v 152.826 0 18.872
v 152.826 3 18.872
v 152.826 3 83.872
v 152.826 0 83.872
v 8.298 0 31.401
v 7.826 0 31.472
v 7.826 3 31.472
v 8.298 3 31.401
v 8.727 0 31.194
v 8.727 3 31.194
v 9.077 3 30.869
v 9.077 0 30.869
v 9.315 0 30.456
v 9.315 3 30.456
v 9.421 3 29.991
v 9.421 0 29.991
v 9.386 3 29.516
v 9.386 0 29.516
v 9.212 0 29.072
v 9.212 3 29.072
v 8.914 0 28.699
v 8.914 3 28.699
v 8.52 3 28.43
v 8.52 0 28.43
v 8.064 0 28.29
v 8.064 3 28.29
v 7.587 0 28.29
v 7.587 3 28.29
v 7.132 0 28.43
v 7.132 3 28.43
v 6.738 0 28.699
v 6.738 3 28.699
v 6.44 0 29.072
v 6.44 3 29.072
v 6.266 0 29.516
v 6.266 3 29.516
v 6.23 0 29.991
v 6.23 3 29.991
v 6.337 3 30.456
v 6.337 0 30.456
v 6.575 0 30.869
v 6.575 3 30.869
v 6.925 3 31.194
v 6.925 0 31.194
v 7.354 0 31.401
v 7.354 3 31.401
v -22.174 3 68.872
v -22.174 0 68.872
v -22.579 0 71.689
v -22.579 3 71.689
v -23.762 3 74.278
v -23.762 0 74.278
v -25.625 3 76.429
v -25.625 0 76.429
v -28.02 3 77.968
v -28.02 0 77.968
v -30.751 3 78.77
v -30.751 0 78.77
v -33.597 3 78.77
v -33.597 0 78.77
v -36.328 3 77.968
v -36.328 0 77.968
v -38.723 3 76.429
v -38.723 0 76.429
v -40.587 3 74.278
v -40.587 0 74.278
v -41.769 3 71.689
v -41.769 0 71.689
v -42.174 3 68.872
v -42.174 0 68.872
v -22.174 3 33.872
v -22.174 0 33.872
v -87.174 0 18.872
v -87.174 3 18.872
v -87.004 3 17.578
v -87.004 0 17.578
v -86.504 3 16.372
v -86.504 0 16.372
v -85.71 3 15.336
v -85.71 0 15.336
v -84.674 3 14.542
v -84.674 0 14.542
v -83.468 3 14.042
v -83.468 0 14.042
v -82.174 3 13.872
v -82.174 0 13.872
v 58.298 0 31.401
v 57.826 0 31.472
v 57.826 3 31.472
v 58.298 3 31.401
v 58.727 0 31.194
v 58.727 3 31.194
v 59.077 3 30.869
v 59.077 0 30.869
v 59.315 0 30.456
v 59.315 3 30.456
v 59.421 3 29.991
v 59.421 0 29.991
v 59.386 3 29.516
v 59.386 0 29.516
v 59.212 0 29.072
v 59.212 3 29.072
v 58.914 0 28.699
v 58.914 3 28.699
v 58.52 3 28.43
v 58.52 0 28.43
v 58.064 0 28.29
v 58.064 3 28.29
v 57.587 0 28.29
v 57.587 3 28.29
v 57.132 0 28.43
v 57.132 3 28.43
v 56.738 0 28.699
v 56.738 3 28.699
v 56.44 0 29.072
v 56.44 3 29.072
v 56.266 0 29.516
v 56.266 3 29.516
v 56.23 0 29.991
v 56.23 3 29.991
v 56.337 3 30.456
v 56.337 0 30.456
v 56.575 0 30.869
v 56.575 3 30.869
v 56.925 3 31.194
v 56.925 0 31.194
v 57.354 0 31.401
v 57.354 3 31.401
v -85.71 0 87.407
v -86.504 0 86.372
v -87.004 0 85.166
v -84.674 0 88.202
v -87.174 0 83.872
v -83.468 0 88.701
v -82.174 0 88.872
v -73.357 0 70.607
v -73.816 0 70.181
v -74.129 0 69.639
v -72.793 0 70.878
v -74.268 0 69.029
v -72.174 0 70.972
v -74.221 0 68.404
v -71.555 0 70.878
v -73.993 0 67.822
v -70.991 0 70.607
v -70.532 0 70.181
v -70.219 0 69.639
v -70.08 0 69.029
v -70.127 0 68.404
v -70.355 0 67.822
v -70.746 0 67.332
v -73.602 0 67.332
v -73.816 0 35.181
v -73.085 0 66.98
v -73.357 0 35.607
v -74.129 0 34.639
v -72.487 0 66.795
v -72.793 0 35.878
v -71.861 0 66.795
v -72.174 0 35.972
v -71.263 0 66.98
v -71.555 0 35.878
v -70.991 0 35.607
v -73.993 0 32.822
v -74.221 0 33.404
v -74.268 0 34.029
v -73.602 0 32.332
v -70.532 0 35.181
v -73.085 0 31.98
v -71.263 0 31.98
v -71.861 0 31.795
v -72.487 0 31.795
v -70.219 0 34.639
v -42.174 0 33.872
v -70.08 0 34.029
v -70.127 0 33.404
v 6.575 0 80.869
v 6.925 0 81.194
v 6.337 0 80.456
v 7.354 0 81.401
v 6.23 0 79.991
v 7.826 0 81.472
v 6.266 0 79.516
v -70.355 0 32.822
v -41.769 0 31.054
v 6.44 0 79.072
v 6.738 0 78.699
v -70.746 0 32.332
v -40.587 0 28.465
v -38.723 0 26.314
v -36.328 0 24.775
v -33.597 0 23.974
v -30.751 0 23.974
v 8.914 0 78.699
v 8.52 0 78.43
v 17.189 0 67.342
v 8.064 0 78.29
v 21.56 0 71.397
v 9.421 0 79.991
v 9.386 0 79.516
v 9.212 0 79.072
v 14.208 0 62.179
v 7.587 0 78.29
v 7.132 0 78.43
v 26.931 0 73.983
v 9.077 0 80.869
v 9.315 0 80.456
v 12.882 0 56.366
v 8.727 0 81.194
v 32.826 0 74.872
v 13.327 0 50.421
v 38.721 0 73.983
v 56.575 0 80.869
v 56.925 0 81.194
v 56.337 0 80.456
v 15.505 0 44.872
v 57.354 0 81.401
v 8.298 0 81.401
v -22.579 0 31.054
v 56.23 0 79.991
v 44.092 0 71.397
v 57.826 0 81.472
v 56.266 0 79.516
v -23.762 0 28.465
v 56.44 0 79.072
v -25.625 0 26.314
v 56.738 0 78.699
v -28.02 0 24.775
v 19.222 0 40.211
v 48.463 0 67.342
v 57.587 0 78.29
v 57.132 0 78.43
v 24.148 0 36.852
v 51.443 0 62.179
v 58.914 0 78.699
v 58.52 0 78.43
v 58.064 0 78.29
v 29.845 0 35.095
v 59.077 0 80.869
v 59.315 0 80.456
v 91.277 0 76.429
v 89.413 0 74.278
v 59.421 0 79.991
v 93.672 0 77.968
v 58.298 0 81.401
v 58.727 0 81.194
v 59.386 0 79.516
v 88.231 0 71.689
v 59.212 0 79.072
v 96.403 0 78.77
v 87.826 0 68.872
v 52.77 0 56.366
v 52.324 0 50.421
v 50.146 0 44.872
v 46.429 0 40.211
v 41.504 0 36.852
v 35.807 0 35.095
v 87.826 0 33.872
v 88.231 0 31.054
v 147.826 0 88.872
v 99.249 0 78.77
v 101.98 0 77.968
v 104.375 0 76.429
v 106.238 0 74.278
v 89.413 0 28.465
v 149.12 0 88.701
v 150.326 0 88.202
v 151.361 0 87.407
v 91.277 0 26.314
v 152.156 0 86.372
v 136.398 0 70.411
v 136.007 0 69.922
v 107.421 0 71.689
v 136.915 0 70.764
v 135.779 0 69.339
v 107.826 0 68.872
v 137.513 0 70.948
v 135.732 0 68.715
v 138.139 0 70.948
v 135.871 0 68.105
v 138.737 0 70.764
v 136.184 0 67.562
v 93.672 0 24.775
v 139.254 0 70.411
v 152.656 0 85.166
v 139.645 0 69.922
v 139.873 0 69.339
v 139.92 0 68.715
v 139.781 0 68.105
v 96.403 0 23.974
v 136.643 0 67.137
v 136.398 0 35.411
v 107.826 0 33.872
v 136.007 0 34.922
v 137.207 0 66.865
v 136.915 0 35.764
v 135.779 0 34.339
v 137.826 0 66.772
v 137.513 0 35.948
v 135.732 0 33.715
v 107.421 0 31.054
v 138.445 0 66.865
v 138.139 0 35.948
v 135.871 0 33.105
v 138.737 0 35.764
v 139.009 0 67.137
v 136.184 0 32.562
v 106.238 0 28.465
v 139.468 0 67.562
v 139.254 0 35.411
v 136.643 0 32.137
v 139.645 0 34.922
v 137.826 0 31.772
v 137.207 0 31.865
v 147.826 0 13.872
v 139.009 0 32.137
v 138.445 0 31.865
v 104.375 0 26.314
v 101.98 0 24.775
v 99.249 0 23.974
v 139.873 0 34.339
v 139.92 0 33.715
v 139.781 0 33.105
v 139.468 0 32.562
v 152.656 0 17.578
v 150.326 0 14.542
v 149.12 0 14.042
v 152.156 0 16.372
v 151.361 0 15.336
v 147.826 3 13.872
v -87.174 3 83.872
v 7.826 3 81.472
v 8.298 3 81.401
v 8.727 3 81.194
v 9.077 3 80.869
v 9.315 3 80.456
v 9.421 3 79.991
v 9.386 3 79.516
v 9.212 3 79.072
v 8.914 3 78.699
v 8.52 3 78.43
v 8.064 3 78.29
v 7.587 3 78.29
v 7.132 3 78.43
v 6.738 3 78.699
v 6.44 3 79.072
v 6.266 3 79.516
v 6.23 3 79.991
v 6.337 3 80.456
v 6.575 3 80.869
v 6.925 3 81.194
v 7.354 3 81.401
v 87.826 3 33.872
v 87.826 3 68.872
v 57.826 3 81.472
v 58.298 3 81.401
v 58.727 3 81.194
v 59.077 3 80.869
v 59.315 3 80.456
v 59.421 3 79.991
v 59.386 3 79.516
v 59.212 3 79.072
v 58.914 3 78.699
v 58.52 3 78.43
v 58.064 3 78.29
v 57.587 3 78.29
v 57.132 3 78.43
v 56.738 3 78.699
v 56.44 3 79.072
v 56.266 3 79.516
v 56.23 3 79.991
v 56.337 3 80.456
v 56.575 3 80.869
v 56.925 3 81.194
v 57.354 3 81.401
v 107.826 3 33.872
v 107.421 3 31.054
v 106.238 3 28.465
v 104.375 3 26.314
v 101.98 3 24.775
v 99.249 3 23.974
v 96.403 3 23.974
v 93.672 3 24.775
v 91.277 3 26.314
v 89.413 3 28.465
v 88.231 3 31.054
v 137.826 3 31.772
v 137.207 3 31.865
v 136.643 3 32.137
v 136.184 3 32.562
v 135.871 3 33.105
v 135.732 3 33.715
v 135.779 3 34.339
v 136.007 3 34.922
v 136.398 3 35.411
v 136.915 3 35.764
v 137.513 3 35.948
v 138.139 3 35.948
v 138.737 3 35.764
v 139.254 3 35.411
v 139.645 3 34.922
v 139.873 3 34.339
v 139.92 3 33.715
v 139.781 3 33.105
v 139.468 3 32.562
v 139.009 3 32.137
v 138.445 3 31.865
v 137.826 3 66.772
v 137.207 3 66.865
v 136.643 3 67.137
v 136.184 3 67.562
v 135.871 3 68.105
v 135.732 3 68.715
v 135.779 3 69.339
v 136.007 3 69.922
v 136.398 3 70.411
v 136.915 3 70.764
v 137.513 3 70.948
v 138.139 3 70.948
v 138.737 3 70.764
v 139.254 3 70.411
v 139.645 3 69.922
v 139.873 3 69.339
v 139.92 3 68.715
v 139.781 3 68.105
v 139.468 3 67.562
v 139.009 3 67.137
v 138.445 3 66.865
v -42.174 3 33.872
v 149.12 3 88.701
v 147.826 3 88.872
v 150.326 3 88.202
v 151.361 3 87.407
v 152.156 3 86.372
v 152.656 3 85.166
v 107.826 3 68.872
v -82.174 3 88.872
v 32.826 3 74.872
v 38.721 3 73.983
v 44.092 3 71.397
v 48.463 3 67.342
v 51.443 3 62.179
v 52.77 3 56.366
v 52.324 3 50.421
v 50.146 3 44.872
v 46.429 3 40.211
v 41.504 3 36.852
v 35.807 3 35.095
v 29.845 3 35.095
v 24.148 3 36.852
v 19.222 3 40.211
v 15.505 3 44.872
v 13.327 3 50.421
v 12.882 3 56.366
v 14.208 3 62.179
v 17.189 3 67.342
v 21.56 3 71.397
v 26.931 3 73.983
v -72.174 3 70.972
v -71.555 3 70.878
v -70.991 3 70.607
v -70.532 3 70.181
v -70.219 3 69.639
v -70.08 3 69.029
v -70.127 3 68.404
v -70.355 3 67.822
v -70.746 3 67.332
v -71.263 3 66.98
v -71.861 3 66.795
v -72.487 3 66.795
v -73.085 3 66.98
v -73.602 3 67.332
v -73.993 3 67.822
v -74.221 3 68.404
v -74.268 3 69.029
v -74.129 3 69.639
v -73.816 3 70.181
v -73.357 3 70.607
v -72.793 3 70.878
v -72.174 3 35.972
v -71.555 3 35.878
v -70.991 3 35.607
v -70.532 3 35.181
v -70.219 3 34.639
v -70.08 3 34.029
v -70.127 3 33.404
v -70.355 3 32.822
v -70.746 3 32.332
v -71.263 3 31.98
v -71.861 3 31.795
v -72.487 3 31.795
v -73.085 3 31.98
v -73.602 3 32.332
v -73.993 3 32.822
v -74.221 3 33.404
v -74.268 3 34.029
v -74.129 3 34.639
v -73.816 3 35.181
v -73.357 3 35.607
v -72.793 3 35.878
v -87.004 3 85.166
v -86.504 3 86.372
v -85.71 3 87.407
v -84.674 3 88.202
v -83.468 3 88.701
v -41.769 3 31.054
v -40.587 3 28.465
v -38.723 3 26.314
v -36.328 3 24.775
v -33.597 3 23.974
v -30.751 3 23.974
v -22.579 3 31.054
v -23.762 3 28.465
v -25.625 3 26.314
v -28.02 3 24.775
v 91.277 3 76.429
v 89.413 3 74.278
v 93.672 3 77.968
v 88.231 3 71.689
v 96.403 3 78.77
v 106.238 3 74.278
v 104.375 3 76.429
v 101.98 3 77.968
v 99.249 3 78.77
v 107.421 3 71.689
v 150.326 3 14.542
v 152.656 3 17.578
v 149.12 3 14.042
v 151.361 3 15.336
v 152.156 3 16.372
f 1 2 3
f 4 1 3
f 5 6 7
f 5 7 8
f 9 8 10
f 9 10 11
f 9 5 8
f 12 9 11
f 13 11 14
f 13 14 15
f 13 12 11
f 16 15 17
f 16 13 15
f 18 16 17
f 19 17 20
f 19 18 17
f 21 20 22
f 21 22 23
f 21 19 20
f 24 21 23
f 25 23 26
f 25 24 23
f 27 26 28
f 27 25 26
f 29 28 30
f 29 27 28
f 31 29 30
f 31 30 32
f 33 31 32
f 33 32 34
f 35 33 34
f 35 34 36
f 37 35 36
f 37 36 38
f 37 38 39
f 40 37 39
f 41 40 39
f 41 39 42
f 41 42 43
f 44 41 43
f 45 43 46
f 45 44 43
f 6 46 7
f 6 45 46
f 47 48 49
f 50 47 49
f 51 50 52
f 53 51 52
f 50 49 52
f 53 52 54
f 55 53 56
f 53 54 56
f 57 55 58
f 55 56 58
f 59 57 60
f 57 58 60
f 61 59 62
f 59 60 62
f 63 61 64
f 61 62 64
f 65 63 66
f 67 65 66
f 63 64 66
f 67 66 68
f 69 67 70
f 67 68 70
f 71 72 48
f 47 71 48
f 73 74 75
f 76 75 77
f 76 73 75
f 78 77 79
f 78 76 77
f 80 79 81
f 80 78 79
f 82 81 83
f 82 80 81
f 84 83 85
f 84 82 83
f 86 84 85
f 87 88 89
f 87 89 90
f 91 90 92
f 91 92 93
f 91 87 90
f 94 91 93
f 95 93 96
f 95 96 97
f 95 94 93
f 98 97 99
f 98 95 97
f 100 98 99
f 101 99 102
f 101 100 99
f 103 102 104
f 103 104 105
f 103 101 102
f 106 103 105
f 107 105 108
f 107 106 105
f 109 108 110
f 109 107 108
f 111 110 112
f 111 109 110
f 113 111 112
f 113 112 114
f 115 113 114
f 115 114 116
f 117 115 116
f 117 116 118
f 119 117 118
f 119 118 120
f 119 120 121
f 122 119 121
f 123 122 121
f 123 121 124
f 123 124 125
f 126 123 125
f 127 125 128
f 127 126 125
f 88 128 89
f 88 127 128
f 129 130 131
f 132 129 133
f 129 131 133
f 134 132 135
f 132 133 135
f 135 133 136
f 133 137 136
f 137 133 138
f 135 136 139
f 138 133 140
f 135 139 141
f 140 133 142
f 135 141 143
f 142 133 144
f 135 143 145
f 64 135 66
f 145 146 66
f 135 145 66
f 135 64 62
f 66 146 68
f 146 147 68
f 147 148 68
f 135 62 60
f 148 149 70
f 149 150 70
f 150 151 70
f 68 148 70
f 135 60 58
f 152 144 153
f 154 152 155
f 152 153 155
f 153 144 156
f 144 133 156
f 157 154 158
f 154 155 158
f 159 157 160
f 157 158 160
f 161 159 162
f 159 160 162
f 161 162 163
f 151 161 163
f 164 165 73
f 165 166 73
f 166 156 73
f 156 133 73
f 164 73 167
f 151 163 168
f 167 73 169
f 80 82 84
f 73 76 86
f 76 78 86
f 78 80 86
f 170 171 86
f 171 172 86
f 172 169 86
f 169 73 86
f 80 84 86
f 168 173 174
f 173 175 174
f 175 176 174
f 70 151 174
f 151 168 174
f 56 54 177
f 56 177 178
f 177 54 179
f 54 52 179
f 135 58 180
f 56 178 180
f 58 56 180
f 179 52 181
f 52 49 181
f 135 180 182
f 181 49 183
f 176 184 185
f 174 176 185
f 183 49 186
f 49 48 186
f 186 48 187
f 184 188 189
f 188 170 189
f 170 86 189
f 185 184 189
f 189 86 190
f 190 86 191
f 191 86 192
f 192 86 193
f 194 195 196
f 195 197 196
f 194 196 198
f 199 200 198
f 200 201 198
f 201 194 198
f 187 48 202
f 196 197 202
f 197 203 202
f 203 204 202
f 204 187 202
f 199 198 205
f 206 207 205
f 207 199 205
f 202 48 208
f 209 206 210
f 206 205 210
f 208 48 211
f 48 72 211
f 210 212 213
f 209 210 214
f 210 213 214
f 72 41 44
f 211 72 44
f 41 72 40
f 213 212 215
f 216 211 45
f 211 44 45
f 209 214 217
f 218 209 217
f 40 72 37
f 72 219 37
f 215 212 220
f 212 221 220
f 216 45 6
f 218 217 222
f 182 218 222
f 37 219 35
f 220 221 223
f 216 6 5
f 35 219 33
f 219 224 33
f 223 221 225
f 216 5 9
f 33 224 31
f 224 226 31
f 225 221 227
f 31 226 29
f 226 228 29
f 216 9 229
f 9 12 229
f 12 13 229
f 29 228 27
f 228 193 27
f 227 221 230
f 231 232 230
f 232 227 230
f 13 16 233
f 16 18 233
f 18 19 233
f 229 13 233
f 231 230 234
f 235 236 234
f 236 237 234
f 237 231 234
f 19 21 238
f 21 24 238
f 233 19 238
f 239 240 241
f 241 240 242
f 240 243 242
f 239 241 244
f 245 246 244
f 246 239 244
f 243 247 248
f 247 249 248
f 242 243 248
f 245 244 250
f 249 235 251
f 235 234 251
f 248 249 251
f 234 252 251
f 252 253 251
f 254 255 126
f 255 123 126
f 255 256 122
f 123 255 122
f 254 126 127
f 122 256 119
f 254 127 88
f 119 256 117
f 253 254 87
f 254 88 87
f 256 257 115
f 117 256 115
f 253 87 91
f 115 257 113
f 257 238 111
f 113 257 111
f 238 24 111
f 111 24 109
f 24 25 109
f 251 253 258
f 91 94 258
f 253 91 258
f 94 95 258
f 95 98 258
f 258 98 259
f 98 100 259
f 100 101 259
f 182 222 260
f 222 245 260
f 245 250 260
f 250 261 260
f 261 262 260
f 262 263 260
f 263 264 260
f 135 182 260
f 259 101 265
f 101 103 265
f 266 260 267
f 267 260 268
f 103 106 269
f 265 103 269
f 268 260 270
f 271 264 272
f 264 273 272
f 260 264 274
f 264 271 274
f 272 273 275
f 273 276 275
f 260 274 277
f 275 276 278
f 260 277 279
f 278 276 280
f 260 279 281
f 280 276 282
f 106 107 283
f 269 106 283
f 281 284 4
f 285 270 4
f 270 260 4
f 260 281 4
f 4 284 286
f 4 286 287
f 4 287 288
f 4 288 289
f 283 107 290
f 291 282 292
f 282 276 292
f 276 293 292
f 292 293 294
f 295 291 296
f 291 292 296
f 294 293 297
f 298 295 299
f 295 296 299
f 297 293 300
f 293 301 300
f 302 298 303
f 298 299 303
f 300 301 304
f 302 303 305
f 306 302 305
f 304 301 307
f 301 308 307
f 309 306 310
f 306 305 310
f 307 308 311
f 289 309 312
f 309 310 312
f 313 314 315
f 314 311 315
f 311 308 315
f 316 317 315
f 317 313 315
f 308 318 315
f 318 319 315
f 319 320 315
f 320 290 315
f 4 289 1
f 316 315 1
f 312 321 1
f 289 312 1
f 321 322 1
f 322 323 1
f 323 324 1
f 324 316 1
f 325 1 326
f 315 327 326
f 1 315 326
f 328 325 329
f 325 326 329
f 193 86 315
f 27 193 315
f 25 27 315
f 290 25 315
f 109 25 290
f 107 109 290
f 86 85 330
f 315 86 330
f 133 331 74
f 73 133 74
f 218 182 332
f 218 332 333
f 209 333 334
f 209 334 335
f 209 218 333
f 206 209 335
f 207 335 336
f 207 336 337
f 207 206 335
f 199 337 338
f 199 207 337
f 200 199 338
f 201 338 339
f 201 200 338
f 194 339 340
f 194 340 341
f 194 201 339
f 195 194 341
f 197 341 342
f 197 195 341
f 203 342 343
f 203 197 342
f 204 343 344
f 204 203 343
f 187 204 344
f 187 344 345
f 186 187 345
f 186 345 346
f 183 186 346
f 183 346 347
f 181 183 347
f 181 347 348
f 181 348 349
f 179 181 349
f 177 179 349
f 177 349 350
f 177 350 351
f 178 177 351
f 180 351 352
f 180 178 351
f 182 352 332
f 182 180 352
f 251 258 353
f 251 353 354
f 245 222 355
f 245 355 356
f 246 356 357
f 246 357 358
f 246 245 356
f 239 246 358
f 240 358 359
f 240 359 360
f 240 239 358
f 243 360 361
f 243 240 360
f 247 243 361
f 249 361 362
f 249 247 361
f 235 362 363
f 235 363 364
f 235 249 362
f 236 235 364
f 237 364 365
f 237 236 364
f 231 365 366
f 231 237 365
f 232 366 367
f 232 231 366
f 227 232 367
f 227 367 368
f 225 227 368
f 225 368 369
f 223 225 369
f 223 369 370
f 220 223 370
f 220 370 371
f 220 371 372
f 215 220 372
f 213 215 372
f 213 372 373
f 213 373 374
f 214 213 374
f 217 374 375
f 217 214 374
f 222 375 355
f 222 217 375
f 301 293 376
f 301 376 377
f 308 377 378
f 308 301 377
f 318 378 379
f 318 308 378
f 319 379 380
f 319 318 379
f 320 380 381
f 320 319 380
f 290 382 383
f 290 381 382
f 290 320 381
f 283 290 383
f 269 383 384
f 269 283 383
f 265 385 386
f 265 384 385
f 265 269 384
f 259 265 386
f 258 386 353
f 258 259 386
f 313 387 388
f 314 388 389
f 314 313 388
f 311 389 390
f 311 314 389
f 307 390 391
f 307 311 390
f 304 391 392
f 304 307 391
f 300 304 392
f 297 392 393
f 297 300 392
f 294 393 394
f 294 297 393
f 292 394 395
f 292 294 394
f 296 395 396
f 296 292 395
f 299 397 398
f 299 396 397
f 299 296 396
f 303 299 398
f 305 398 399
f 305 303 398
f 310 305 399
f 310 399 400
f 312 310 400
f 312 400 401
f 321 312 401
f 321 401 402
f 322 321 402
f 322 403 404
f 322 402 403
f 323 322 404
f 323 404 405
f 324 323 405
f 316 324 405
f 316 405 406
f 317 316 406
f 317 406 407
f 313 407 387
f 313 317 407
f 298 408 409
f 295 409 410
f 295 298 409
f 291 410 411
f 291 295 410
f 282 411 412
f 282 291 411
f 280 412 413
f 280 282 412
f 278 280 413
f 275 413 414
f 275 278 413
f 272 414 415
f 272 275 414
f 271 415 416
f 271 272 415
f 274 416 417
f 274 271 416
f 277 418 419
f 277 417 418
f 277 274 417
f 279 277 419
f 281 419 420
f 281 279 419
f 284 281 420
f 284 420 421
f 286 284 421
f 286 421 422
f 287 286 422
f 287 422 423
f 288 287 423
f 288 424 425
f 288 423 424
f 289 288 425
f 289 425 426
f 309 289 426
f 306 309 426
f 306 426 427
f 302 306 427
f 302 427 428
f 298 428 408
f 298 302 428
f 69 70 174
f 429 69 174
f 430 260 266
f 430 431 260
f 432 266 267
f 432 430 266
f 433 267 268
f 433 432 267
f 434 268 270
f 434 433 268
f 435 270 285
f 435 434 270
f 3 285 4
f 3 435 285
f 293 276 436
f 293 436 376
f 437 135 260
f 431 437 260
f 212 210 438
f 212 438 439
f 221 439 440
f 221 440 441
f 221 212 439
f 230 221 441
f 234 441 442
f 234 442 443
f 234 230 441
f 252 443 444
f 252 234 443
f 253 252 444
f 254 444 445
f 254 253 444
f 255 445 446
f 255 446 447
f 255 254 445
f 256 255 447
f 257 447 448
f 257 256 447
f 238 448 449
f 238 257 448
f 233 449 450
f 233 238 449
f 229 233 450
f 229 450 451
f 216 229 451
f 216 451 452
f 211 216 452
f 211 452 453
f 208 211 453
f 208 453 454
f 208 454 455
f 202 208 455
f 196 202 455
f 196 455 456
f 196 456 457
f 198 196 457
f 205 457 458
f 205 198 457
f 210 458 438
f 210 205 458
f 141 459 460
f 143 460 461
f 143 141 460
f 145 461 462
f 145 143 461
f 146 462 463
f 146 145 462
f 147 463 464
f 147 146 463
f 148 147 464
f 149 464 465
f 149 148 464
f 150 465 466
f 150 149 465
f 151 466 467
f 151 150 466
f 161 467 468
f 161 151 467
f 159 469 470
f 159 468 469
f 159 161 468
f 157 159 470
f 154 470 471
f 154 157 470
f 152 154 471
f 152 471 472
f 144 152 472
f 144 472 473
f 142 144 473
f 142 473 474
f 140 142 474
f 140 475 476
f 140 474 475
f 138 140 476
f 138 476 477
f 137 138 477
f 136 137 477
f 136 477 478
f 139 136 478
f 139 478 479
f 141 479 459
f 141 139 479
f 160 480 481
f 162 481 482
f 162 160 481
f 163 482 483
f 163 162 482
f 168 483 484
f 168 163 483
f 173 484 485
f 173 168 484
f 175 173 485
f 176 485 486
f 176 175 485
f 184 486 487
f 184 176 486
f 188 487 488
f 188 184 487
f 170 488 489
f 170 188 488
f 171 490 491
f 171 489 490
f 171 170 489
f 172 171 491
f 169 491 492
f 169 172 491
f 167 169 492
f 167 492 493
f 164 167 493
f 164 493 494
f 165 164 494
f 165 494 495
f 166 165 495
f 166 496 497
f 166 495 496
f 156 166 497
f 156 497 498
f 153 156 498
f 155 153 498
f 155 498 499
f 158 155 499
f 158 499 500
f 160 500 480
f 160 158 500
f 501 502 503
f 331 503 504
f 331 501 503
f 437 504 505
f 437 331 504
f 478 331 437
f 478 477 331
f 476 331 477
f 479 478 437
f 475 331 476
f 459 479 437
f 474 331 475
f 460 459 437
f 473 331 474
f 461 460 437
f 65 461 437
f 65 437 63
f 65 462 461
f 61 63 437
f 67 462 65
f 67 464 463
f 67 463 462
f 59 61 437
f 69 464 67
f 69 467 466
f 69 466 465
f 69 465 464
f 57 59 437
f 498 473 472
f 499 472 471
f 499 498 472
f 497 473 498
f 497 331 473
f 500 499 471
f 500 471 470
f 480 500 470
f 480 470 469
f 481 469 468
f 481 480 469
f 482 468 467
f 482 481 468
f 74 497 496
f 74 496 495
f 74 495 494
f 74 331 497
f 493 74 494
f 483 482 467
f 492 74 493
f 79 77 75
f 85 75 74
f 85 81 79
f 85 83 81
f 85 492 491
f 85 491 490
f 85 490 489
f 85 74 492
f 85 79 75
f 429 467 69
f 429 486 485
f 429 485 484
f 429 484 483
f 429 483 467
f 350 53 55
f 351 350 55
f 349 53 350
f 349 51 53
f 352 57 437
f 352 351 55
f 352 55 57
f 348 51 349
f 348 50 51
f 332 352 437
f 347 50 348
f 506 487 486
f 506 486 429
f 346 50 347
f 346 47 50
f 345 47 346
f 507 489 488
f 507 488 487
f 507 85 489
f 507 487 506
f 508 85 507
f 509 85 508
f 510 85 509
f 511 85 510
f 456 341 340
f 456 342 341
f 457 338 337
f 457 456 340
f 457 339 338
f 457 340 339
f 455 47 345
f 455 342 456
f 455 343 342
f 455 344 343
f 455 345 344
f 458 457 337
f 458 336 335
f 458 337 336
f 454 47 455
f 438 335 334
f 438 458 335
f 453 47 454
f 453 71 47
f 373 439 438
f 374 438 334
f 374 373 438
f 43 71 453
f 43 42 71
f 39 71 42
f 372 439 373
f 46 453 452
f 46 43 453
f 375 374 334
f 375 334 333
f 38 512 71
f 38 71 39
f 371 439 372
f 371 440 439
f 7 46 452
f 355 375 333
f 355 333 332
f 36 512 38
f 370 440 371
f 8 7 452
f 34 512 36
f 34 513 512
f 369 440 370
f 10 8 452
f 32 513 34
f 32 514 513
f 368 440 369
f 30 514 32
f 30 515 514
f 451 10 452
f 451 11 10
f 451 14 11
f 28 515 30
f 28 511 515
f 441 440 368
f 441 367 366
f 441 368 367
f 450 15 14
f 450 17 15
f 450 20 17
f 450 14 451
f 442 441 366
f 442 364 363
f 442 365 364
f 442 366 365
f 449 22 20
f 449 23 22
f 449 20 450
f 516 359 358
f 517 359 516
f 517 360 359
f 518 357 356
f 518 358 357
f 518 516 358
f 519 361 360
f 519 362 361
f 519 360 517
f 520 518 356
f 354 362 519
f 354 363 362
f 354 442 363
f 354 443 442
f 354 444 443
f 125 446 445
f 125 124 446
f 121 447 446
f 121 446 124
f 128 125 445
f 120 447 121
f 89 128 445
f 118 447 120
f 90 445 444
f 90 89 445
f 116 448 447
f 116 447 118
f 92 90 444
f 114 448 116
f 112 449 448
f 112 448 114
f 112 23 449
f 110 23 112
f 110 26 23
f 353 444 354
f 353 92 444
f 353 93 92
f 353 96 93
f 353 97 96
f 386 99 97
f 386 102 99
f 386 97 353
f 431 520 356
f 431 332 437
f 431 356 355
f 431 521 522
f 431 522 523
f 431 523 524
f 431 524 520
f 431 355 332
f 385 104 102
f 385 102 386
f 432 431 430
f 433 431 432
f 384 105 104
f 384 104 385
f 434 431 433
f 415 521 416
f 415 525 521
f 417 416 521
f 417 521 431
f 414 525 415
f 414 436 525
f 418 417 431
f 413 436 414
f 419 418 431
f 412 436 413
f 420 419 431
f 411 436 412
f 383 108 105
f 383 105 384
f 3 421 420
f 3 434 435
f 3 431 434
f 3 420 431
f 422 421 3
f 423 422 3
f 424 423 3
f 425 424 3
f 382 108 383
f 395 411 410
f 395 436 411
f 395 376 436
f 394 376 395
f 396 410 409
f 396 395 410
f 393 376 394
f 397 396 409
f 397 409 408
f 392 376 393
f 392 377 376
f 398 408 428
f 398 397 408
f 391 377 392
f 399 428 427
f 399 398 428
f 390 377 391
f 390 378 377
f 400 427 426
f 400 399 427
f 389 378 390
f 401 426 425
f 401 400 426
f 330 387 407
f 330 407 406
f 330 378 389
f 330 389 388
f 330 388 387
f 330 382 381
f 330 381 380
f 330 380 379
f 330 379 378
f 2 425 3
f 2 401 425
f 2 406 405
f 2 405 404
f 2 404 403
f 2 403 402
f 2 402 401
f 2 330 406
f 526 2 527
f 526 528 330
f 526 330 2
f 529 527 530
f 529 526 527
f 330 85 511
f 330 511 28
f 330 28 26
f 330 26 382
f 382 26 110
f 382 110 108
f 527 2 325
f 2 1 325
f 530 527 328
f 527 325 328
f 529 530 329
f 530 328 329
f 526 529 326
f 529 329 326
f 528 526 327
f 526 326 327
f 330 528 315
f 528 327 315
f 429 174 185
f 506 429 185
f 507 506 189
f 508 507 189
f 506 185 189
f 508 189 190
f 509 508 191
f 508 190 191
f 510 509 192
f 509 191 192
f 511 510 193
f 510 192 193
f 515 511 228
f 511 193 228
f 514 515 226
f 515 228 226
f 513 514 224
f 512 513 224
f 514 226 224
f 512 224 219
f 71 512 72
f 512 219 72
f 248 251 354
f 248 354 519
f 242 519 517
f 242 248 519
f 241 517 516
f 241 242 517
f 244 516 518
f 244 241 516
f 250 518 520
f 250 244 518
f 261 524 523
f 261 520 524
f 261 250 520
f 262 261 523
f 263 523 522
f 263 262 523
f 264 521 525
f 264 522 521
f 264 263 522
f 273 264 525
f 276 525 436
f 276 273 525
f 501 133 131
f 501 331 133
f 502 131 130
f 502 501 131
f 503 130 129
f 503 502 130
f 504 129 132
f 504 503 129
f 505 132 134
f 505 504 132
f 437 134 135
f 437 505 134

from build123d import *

# Parameters (mm, degrees)
SKETCH_1_W          = 400
SKETCH_1_H          = 60
SKETCH_1_R          = 1.6
SKETCH_1_W_2        = 21
SKETCH_1_H_2        = 21
SKETCH_1_W_3        = 240
SKETCH_1_H_3        = 75
SKETCH_1_R_2        = 20
EXTRUDE_1484_DEPTH  = 3
SKETCH_2_R          = 2.05
SKETCH_2_R_2        = 2.1
CUT_EXTRUDE_1_DEPTH = 250.229009796
FILLET_1_R          = 5
SKETCH1_R           = 2.1
CUT_EXTRUDE4_DEPTH  = 250.229009796
CUT_EXTRUDE_2_DEPTH = 10
FILLET_2_R          = 5


with BuildPart() as part:
    # 草图1 → Extrude 1484 (new body)
    # profile 1 of 2: a face of its own
    with BuildSketch(Plane(origin=(0, 0, 0), x_dir=(1, 0, 0), z_dir=(0, 1, 0))):
        with Locations((32.825924772, 16.128249268)):
            Rectangle(SKETCH_1_W, SKETCH_1_H)
        with Locations(Location((-14.674075228, 36.128249268, 0), (0, 0, 270))):
            Circle(SKETCH_1_R, mode=Mode.SUBTRACT)
        with Locations(Location((-14.674075228, 11.128249268, 0), (0, 0, 270))):
            Circle(SKETCH_1_R, mode=Mode.SUBTRACT)
        with Locations(Location((80.325924772, 11.128249268, 0), (0, 0, 270))):
            Circle(SKETCH_1_R, mode=Mode.SUBTRACT)
        with Locations(Location((80.325924772, 36.128249268, 0), (0, 0, 270))):
            Circle(SKETCH_1_R, mode=Mode.SUBTRACT)
        with Locations((32.825924772, 10.628249268)):
            Rectangle(SKETCH_1_W_2, SKETCH_1_H_2, mode=Mode.SUBTRACT)
    # profile 2 of 2: a face of its own
    with BuildSketch(Plane(origin=(0, 0, 0), x_dir=(1, 0, 0), z_dir=(0, 1, 0))):
        with Locations((32.825924772, -51.371750732)):
            Rectangle(SKETCH_1_W_3, SKETCH_1_H_3)
        with Locations(Location((7.825924772, -29.871750732, 0), (0, 0, 270))):
            Circle(SKETCH_1_R, mode=Mode.SUBTRACT)
        with Locations(Location((7.825924772, -79.871750732, 0), (0, 0, 270))):
            Circle(SKETCH_1_R, mode=Mode.SUBTRACT)
        with Locations(Location((57.825924772, -79.871750732, 0), (0, 0, 270))):
            Circle(SKETCH_1_R, mode=Mode.SUBTRACT)
        with Locations(Location((57.825924772, -29.871750732, 0), (0, 0, 270))):
            Circle(SKETCH_1_R, mode=Mode.SUBTRACT)
        with Locations(Location((32.825924772, -54.871750732, 0), (0, 0, 270))):
            Circle(SKETCH_1_R_2, mode=Mode.SUBTRACT)
    extrude(amount=EXTRUDE_1484_DEPTH)

    # 草图2 → 切除-拉伸1 (cut, through all)
    with BuildSketch(Plane(origin=(0, 3, 0), x_dir=(1, 0, 0), z_dir=(0, 1, 0))):
        with Locations(Location((-149.174075228, 29.628249268, 0), (0, 0, 270))):
            Circle(SKETCH_2_R)
        with Locations(Location((-149.174075228, 2.628249268, 0), (0, 0, 270))):
            Circle(SKETCH_2_R)
        with Locations(Location((-121.674075228, 29.628249268, 0), (0, 0, 270))):
            Circle(SKETCH_2_R)
        with Locations(Location((-121.674075228, 2.628249268, 0), (0, 0, 90))):
            Circle(SKETCH_2_R)
        with Locations(Location((-51.674075228, 41.128249268, 0), (0, 0, 270))):
            Circle(SKETCH_2_R_2)
        with Locations(Location((-86.674075228, 41.128249268, 0), (0, 0, 270))):
            Circle(SKETCH_2_R_2)
        with Locations(Location((-51.674075228, -8.871750732, 0), (0, 0, 90))):
            Circle(SKETCH_2_R_2)
        with Locations(Location((-86.674075228, -8.871750732, 0), (0, 0, 90))):
            Circle(SKETCH_2_R_2)
        with Locations(Location((-135.424075228, 41.128249268, 0), (0, 0, 270))):
            Circle(SKETCH_2_R_2)
        with Locations(Location((-135.424075228, -8.871750732, 0), (0, 0, 90))):
            Circle(SKETCH_2_R_2)
        with Locations(Location((201.075924772, -8.871750732, 0), (0, 0, 270))):
            Circle(SKETCH_2_R_2)
        with Locations(Location((201.075924772, 41.128249268, 0), (0, 0, 90))):
            Circle(SKETCH_2_R_2)
        with Locations(Location((152.325924772, -8.871750732, 0), (0, 0, 270))):
            Circle(SKETCH_2_R_2)
        with Locations(Location((117.325924772, -8.871750732, 0), (0, 0, 270))):
            Circle(SKETCH_2_R_2)
        with Locations(Location((152.325924772, 41.128249268, 0), (0, 0, 90))):
            Circle(SKETCH_2_R_2)
        with Locations(Location((117.325924772, 41.128249268, 0), (0, 0, 90))):
            Circle(SKETCH_2_R_2)
        with Locations(Location((187.325924772, 2.628249268, 0), (0, 0, 270))):
            Circle(SKETCH_2_R)
        with Locations(Location((187.325924772, 29.628249268, 0), (0, 0, 90))):
            Circle(SKETCH_2_R)
        with Locations(Location((214.825924772, 2.628249268, 0), (0, 0, 90))):
            Circle(SKETCH_2_R)
        with Locations(Location((214.825924772, 29.628249268, 0), (0, 0, 90))):
            Circle(SKETCH_2_R)
    extrude(amount=-CUT_EXTRUDE_1_DEPTH, mode=Mode.SUBTRACT)

    # 圆角1
    fillet_1_edges = [part.edges().sort_by_distance(p)[0] for p in [
        (-167.174075228, 1.5, 13.871750732),
        (-167.174075228, 1.5, -46.128249268),
        (232.825924772, 1.5, -46.128249268),
        (232.825924772, 1.5, 13.871750732),
        (152.825924772, 1.5, 13.871750732),
        (152.825924772, 1.5, 88.871750732),
        (-87.174075228, 1.5, 88.871750732),
        (-87.174075228, 1.5, 13.871750732),
    ]]
    fillet(fillet_1_edges, radius=FILLET_1_R)

    # Sketch1 → Cut-Extrude4 (cut, through all)
    with BuildSketch(Plane(origin=(0, 0, 0), x_dir=(1, 0, 0), z_dir=(0, 1, 0))):
        with Locations(Location((-72.174075228, -33.871750732, 0), (0, 0, 270))):
            Circle(SKETCH1_R)
        with Locations(Location((-72.174075228, -68.871750732, 0), (0, 0, 270))):
            Circle(SKETCH1_R)
        with Locations(Location((137.825924772, -68.871750732, 0), (0, 0, 90))):
            Circle(SKETCH1_R)
        with Locations(Location((137.825924772, -33.871750732, 0), (0, 0, 90))):
            Circle(SKETCH1_R)
        with BuildLine():
            Line((-42.174075228, -68.871750732), (-42.174075228, -33.871750732))
            ThreePointArc((-42.174075228, -33.871750732), (-32.174075228, -23.871750732), (-22.174075228, -33.871750732))
            Line((-22.174075228, -33.871750732), (-22.174075228, -68.871750732))
            ThreePointArc((-22.174075228, -68.871750732), (-32.174075228, -78.871750732), (-42.174075228, -68.871750732))
        make_face()
        with BuildLine():
            Line((107.825924772, -68.871750732), (107.825924772, -33.871750732))
            ThreePointArc((107.825924772, -33.871750732), (97.825924772, -23.871750732), (87.825924772, -33.871750732))
            Line((87.825924772, -33.871750732), (87.825924772, -68.871750732))
            ThreePointArc((87.825924772, -68.871750732), (97.825924772, -78.871750732), (107.825924772, -68.871750732))
        make_face()
    extrude(amount=CUT_EXTRUDE4_DEPTH, mode=Mode.SUBTRACT)

    # 草图3 → 切除-拉伸2 (cut)
    with BuildSketch(Plane(origin=(0, 3, 0), x_dir=(1, 0, 0), z_dir=(0, 1, 0))):
        with BuildLine():
            Line((227.825924772, 46.128249268), (-162.174075228, 46.128249268))
            ThreePointArc((-162.174075228, 46.128249268), (-165.709609134, 44.663783174), (-167.174075228, 41.128249268))
            Line((-167.174075228, 41.128249268), (-167.174075228, -8.871750732))
            ThreePointArc((-167.174075228, -8.871750732), (-165.709609134, -12.407284637), (-162.174075228, -13.871750732))
            Line((-162.174075228, -13.871750732), (-92.174075228, -13.871750732))
            Line((-92.174075228, -13.871750732), (157.825924772, -13.871750732))
            Line((157.825924772, -13.871750732), (227.825924772, -13.871750732))
            ThreePointArc((227.825924772, -13.871750732), (231.361458678, -12.407284637), (232.825924772, -8.871750732))
            Line((232.825924772, -8.871750732), (232.825924772, 41.128249268))
            ThreePointArc((232.825924772, 41.128249268), (231.361458678, 44.663783174), (227.825924772, 46.128249268))
        make_face()
        with BuildLine():
            Line((-87.174075228, -13.871750732), (-92.174075228, -13.871750732))
            ThreePointArc((-92.174075228, -13.871750732), (-88.638541322, -15.336216826), (-87.174075228, -18.871750732))
            Line((-87.174075228, -18.871750732), (-87.174075228, -13.871750732))
        make_face()
        with BuildLine():
            Line((157.825924772, -13.871750732), (152.825924772, -13.871750732))
            Line((152.825924772, -13.871750732), (152.825924772, -18.871750732))
            ThreePointArc((152.825924772, -18.871750732), (154.290390866, -15.336216826), (157.825924772, -13.871750732))
        make_face()
    extrude(amount=-CUT_EXTRUDE_2_DEPTH, mode=Mode.SUBTRACT)

    # 圆角2
    fillet_2_edges = [part.edges().sort_by_distance(p)[0] for p in [
        (152.825924772, 1.5, 13.871750732),
        (-87.174075228, 1.5, 13.871750732),
    ]]
    fillet(fillet_2_edges, radius=FILLET_2_R)


solid = part.part
